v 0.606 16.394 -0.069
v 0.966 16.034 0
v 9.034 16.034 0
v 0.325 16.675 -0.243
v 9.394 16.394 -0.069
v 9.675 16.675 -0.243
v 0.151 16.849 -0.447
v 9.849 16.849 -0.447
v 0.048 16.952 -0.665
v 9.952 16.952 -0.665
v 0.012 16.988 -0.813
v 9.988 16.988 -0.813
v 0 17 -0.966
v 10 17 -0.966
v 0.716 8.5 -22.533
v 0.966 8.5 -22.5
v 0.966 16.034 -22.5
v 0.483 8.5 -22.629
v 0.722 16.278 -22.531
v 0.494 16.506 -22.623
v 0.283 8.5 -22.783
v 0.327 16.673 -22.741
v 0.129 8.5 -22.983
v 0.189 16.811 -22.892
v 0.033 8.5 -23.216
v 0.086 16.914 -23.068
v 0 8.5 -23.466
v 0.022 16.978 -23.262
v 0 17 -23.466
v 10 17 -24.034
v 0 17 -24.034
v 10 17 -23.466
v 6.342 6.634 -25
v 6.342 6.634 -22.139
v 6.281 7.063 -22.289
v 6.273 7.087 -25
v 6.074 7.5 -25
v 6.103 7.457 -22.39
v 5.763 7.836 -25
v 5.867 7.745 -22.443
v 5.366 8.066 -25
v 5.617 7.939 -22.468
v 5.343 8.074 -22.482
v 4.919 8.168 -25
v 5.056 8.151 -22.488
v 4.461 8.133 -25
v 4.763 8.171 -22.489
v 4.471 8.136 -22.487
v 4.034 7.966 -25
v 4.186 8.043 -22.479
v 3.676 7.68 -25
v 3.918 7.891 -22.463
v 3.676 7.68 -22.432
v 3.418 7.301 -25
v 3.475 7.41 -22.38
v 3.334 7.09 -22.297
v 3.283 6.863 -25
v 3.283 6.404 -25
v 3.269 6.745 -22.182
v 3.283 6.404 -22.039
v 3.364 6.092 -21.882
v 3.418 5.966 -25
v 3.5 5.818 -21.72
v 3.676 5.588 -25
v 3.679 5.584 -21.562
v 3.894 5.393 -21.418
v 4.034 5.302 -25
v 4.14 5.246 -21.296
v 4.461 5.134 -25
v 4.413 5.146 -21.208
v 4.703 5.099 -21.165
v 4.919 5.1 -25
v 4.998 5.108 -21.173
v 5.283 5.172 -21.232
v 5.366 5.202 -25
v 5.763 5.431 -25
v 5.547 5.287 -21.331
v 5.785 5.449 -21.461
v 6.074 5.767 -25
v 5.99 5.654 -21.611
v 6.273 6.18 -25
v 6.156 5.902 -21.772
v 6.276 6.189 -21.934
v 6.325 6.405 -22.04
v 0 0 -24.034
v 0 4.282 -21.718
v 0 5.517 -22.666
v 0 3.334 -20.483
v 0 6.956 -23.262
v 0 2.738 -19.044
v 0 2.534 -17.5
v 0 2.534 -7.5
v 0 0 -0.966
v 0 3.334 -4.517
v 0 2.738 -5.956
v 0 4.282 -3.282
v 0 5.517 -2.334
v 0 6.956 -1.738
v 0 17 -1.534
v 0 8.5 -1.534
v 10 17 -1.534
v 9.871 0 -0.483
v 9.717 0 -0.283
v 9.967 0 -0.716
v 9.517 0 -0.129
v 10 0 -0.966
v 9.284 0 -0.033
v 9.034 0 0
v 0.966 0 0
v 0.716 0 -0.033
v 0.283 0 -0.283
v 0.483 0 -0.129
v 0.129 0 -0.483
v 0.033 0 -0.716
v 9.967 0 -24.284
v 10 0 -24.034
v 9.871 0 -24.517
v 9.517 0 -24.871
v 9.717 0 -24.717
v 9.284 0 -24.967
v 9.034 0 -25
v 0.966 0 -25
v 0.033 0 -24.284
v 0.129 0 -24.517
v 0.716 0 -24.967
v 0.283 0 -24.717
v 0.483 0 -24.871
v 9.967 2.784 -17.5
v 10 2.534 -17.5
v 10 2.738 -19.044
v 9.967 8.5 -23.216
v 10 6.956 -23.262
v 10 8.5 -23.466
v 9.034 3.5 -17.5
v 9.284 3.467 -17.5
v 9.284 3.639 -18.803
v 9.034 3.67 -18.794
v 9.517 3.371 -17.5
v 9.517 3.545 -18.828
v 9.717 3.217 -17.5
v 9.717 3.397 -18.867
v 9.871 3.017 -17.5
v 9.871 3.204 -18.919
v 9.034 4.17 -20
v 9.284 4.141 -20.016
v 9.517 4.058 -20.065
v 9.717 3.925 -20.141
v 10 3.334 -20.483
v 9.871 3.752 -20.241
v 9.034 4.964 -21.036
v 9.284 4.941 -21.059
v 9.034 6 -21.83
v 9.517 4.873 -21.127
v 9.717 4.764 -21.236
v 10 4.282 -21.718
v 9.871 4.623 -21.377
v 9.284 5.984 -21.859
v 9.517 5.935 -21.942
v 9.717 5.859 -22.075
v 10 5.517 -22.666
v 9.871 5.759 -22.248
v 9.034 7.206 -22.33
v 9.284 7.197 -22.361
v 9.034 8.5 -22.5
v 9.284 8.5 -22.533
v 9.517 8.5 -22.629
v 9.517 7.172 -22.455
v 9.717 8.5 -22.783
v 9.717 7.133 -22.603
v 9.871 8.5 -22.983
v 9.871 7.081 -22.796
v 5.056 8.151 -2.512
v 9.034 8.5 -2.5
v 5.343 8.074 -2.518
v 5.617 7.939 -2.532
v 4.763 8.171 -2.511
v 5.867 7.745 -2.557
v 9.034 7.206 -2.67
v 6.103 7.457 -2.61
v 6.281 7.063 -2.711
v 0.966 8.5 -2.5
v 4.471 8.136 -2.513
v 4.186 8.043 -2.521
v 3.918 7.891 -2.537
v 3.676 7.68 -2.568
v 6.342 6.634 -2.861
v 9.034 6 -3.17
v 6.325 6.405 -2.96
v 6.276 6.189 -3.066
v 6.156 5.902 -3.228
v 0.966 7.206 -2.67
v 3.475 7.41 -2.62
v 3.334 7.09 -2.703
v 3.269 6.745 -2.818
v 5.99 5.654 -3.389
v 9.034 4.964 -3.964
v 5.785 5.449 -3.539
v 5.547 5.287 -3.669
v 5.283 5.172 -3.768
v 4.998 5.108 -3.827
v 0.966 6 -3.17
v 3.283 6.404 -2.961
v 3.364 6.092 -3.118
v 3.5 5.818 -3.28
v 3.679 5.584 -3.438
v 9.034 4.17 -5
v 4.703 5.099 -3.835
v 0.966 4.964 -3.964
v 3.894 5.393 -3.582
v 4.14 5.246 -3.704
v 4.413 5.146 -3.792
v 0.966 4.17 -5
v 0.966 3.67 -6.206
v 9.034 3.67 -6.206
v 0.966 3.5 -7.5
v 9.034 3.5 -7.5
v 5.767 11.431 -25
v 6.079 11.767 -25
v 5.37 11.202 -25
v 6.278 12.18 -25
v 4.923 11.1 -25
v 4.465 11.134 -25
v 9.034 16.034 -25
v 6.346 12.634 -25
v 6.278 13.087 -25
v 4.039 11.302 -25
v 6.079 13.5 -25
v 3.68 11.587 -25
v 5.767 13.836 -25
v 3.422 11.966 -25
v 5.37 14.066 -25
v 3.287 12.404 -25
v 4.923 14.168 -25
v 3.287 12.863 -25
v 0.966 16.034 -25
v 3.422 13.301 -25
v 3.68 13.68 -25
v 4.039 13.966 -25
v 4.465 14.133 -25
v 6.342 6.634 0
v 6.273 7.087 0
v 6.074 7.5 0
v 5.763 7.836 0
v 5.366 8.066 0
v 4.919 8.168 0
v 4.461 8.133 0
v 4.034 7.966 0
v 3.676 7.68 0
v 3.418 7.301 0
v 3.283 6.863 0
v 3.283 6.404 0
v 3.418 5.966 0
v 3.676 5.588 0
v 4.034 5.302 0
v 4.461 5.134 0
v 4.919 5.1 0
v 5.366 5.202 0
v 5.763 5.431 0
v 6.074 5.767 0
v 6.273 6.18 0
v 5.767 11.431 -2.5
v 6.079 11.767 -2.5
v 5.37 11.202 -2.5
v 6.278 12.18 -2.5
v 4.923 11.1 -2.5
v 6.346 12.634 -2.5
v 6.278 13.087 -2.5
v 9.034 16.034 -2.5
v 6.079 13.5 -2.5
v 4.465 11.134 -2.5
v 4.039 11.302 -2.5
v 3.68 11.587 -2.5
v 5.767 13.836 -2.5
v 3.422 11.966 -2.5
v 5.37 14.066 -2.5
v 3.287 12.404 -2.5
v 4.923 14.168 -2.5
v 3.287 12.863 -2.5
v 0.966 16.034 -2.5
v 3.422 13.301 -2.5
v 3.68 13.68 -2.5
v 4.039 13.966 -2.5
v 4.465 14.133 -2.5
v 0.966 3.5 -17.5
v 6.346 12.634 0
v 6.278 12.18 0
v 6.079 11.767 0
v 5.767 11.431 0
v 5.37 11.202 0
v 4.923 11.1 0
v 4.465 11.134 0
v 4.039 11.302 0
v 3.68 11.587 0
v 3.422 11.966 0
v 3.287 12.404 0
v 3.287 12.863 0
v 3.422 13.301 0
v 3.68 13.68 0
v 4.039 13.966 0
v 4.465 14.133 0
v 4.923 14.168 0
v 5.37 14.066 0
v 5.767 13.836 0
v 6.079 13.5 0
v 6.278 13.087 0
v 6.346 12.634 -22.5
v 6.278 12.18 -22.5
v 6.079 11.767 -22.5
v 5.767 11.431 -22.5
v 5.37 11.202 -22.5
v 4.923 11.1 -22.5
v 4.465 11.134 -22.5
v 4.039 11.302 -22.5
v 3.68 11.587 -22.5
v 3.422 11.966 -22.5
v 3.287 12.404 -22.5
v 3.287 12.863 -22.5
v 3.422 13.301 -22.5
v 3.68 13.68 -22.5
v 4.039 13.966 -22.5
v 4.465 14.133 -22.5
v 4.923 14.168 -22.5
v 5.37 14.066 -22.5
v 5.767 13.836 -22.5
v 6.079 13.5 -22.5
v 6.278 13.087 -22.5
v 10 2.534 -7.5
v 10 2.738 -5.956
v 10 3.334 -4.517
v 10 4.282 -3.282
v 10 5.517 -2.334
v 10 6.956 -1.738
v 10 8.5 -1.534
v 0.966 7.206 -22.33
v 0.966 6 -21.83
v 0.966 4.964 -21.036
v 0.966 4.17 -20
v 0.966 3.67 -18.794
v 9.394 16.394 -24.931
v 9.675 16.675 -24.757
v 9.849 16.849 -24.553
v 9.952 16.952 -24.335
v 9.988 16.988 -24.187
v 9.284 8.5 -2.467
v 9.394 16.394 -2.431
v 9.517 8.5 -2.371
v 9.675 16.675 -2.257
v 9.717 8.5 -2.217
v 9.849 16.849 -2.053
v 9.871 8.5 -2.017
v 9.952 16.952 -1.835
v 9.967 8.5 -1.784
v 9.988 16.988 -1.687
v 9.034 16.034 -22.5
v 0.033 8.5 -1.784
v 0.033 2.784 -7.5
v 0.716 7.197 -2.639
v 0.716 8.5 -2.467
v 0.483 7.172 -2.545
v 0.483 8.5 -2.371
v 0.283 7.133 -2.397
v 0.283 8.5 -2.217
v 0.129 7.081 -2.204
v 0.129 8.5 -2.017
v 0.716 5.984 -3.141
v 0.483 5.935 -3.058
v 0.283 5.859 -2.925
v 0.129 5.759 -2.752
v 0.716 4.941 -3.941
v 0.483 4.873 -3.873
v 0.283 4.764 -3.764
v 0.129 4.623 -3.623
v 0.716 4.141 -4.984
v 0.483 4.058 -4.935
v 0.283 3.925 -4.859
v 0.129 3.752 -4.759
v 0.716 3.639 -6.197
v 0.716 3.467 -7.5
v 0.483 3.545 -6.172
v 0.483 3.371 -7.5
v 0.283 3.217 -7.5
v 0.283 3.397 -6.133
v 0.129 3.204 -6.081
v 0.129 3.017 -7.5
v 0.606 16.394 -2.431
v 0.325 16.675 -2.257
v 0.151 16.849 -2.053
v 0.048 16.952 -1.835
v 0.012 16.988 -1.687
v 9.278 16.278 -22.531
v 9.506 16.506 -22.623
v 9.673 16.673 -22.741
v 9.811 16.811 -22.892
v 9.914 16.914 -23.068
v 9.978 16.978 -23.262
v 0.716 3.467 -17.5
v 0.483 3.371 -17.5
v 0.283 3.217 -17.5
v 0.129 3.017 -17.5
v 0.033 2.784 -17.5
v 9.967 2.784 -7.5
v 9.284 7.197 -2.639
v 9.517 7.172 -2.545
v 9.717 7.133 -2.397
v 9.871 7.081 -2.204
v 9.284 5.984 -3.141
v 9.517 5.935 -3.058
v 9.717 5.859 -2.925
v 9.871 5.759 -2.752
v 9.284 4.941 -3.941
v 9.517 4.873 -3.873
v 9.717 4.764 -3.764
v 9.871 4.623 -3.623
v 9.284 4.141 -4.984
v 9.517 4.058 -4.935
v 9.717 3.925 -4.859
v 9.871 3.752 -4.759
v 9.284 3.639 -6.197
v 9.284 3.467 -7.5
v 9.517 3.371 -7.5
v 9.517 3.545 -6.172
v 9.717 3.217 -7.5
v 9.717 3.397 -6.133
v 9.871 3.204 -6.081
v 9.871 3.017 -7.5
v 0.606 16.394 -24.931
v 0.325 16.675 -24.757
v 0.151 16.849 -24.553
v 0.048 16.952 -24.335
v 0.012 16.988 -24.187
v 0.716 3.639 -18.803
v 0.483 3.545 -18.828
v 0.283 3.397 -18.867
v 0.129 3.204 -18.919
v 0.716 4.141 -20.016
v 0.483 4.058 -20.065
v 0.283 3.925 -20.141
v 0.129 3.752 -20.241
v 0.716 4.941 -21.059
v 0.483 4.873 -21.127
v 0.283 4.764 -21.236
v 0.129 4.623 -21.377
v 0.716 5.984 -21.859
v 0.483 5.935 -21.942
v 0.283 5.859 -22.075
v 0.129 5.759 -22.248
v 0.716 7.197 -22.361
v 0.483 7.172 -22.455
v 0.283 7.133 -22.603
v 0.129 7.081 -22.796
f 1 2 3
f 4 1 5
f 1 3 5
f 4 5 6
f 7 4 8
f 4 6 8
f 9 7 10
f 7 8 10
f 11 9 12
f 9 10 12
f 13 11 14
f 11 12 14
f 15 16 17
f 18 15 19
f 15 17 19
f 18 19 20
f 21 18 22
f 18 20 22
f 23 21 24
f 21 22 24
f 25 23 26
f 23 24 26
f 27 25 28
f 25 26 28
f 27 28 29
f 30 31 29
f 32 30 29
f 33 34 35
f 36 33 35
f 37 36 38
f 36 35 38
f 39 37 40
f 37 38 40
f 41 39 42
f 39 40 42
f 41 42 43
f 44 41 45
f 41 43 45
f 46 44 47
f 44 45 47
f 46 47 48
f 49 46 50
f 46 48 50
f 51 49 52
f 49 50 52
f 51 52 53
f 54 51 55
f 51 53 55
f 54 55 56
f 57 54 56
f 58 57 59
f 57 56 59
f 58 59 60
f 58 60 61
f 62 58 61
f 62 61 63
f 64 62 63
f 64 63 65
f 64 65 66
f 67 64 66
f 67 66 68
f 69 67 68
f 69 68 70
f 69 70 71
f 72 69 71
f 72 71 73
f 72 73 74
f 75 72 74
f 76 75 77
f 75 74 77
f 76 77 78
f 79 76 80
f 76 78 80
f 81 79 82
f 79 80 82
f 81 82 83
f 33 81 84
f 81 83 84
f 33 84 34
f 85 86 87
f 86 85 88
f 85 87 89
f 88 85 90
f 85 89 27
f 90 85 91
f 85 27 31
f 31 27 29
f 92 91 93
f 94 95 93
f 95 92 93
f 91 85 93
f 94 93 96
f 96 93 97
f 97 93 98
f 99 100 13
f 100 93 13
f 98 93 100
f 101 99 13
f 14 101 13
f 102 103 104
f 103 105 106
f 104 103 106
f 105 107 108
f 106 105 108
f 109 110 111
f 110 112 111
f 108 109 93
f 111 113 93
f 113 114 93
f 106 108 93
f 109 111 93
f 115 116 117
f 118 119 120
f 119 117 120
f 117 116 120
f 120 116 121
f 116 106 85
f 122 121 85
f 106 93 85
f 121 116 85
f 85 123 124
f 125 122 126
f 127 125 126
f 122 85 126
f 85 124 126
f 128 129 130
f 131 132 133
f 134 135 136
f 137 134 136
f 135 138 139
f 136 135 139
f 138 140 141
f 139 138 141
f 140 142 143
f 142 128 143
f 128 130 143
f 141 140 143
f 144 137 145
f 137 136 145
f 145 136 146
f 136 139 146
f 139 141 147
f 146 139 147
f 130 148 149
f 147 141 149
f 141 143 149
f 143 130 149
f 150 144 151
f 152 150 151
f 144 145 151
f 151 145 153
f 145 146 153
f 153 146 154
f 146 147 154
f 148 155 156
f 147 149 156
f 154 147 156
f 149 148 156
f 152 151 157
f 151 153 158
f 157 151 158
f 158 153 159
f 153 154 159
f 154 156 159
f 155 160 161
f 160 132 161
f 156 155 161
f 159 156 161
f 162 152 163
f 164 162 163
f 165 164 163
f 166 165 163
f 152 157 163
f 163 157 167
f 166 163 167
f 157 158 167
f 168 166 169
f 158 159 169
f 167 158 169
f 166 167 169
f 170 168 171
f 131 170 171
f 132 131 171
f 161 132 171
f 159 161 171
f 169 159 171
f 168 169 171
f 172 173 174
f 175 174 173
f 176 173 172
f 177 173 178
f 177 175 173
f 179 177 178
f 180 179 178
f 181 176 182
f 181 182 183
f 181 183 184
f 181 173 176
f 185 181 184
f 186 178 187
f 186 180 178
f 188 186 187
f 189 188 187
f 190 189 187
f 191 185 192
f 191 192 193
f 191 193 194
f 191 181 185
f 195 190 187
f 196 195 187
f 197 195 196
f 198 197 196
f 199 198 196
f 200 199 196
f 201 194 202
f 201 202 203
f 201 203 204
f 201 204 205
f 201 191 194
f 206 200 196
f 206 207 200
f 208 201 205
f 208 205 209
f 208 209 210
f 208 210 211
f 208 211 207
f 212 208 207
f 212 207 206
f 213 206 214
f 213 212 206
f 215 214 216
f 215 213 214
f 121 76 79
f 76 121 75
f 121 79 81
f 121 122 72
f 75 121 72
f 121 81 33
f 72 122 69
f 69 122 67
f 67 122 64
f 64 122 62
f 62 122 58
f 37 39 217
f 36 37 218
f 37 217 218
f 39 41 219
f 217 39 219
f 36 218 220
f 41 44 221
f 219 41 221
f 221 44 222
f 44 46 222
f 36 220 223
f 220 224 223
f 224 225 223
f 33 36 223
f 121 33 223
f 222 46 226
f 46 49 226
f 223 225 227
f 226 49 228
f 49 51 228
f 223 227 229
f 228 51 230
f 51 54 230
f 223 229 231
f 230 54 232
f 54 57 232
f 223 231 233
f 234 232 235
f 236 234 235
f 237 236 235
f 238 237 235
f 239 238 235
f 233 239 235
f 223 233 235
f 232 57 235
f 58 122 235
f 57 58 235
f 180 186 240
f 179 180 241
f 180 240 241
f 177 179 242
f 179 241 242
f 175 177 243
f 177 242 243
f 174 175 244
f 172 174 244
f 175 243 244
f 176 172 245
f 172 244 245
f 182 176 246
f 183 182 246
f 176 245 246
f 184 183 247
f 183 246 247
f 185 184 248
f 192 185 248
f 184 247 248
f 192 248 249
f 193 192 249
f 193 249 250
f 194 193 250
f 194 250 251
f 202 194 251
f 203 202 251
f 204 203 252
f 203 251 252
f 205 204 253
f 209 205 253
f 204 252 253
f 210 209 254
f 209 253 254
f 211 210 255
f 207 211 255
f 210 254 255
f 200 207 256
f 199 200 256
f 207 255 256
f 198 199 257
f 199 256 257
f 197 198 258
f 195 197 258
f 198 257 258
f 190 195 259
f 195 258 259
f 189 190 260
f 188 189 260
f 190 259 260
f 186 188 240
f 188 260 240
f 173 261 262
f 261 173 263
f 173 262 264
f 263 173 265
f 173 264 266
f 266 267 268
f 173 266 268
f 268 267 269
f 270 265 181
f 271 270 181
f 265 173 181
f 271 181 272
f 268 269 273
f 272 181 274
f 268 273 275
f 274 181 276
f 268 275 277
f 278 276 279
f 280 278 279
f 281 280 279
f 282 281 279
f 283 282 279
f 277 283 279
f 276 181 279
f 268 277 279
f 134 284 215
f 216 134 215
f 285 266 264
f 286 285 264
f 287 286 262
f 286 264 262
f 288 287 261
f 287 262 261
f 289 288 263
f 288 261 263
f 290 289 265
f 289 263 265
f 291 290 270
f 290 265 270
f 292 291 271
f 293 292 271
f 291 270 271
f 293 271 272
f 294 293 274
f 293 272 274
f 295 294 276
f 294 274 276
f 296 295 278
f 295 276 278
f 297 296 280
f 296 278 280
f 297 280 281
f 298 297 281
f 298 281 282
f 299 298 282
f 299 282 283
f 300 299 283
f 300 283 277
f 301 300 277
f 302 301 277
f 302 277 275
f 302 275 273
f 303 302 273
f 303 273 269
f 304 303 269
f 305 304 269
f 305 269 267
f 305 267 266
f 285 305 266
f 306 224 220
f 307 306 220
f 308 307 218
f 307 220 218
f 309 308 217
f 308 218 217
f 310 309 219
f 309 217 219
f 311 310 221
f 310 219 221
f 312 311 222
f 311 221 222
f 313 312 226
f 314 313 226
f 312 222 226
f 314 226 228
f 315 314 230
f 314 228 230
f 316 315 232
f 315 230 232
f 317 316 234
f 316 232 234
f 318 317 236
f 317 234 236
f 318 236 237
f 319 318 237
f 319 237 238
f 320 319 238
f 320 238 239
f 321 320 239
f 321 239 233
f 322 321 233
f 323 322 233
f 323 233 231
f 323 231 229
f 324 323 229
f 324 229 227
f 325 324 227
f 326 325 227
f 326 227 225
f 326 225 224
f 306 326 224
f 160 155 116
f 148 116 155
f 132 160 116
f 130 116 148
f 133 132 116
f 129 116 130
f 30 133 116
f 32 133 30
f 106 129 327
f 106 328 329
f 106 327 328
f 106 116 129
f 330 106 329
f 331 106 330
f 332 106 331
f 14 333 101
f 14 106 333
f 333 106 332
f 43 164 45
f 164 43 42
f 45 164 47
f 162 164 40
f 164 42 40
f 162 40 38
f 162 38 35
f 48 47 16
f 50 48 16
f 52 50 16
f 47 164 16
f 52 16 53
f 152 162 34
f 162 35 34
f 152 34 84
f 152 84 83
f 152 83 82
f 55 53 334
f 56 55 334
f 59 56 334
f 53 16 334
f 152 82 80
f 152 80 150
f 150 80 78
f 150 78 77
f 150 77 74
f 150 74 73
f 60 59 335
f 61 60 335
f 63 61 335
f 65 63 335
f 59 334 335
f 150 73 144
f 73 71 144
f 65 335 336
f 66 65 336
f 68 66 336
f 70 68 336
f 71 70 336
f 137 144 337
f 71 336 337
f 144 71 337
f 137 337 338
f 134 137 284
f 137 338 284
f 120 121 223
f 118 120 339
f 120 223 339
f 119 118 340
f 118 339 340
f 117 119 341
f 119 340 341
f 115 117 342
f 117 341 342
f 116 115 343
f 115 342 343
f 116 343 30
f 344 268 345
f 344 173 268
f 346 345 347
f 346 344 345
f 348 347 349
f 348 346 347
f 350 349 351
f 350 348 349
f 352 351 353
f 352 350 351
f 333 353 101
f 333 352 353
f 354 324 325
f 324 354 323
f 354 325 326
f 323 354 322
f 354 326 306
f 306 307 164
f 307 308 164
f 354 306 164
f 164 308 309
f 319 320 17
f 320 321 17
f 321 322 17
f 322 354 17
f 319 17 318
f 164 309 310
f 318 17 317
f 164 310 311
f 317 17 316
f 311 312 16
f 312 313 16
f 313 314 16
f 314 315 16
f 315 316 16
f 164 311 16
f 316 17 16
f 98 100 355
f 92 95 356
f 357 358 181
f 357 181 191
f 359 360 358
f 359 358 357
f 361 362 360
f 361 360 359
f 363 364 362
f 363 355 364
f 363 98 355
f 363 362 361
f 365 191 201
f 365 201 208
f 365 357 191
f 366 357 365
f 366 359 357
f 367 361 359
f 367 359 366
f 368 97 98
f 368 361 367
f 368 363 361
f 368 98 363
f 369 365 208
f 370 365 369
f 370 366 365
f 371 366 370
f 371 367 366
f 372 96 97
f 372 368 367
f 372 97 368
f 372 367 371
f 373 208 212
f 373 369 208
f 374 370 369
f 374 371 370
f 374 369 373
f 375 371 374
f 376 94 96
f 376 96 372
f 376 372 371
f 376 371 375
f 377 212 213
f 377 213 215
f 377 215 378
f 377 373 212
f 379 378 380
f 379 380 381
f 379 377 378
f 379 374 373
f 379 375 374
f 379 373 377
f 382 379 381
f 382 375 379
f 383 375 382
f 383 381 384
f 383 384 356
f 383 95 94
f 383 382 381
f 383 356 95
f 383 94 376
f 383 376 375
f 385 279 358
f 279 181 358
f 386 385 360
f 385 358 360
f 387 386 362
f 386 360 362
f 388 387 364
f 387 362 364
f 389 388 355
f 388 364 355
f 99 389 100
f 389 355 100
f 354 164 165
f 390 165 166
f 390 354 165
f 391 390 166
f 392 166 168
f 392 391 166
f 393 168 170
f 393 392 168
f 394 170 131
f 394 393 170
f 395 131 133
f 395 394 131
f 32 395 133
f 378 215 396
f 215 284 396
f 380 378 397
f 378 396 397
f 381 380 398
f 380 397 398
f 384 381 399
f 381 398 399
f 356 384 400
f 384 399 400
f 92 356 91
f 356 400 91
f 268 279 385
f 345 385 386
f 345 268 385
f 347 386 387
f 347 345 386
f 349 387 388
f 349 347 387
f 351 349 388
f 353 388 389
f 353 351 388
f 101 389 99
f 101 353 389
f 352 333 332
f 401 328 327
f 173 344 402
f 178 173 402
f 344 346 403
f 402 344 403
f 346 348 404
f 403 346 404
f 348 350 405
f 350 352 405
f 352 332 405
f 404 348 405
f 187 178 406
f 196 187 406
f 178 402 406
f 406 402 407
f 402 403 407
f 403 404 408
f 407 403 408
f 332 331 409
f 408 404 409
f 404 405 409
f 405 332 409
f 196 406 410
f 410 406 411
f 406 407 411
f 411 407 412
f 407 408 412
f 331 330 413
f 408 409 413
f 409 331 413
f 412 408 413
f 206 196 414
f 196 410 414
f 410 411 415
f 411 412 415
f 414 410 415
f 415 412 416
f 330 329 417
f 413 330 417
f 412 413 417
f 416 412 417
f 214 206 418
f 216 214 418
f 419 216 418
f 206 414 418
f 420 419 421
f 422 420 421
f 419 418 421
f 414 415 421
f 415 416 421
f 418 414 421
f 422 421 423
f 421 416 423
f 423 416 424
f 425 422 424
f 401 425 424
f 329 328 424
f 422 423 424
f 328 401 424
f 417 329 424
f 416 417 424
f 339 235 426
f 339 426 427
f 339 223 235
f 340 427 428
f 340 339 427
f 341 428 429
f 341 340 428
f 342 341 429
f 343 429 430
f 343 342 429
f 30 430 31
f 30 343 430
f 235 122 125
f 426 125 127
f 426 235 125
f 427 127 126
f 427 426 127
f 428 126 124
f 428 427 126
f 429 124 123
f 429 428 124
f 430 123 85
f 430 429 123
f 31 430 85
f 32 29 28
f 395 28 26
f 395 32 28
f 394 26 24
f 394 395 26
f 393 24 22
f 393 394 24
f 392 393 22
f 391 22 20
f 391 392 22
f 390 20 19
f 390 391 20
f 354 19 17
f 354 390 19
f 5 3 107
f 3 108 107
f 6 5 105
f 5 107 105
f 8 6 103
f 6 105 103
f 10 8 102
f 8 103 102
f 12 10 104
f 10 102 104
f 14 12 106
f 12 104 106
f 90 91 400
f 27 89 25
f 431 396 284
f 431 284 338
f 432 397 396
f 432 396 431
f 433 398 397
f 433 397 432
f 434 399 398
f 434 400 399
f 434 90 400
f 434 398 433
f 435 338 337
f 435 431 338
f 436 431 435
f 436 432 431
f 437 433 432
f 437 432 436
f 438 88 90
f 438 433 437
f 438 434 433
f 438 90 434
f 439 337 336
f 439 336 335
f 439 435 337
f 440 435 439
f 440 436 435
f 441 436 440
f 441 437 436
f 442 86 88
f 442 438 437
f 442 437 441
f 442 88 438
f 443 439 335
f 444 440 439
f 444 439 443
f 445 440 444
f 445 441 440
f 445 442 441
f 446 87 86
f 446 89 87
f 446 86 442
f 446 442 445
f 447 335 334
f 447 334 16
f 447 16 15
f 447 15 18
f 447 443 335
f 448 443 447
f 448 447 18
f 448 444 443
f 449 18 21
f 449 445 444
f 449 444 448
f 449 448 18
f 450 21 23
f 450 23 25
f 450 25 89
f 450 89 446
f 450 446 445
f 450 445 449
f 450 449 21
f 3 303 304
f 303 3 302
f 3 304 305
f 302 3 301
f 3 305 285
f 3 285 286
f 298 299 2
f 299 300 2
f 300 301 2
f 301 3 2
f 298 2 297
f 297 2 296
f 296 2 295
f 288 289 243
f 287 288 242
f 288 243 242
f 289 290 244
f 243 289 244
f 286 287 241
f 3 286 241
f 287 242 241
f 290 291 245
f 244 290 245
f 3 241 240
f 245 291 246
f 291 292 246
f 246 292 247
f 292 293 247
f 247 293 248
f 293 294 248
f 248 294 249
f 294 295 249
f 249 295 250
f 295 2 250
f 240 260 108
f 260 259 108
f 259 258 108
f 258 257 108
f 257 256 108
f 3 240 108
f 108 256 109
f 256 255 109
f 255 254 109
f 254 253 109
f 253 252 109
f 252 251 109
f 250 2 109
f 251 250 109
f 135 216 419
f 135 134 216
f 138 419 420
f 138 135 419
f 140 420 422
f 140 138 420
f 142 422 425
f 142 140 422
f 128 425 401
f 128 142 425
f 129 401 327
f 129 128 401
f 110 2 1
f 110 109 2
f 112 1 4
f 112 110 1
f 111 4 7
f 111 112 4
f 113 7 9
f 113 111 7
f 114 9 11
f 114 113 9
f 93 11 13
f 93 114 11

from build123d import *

# Parameters (mm, degrees)
F1_DEPTH     = 10
F2_R         = 1.538196108
F3_DEPTH     = 25
F4_T4_DEPTH  = 10
F4_S5_R      = 1.538196108
F4_T6_DEPTH  = 8
F4_T10_DEPTH = 10
F4_S11_R     = 1.538196108
F4_T12_DEPTH = 8
F5_R         = 0.9656854249


# Not quite as in the source:
# - a fillet or chamfer that OpenCascade refuses, or shapes differently, is made with other operations: its cross-section is extruded or revolved along the edge and cut away or added


with BuildPart() as f1:
    # F0 (on Right) → F1 (new body)
    with BuildSketch(Plane.YZ):
        Polygon((17, 0), (0, 0), (0, -25), (17, -25), (17, -22.5), (3.5, -22.5), (3.5, -2.5), (17, -2.5), align=None)
    extrude(amount=F1_DEPTH)

    # F2 (on face) → F3 (cut)
    with BuildSketch(Plane(origin=(0, 0, -25), x_dir=(1, 0, 0), z_dir=(0, 0, -1))):
        with Locations((4.8035508953, -6.6337394528)):
            Circle(F2_R)
        with Locations((4.8077256637, -12.6337380004)):
            Circle(F2_R)
    extrude(amount=-F3_DEPTH, mode=Mode.SUBTRACT)

    # F4: fillet of radius 5 on 2 edges, made by hand


with BuildPart() as f4_tool2:
    # F4_s3 → F4_t4 (new body)
    with BuildSketch(Plane.YZ):
        with BuildLine():
            ThreePointArc((8.5, -2.5), (4.9644660941, -3.9644660941), (3.5, -7.5))
            Line((3.5, -7.5), (3.5, -2.5))
            Line((3.5, -2.5), (8.5, -2.5))
        make_face()
    extrude(amount=F4_T4_DEPTH)

    # F4_s5 → F4_t6 (cut, symmetric)
    with BuildSketch(Plane.XY.offset(-5)):
        with Locations((4.8035508953, 6.6337394528)):
            Circle(F4_S5_R)
    extrude(amount=F4_T6_DEPTH, both=True, mode=Mode.SUBTRACT)


with BuildPart() as f1_1:
    add(f1.part)

    # F4_t1: union F4_tool2
    add(f4_tool2.part)


with BuildPart() as f4_tool8:
    # F4_s9 → F4_t10 (new body)
    with BuildSketch(Plane.YZ):
        with BuildLine():
            ThreePointArc((8.5, -22.5), (4.9644660941, -21.0355339059), (3.5, -17.5))
            Line((3.5, -17.5), (3.5, -22.5))
            Line((3.5, -22.5), (8.5, -22.5))
        make_face()
    extrude(amount=F4_T10_DEPTH)

    # F4_s11 → F4_t12 (cut, symmetric)
    with BuildSketch(Plane.XY.offset(-20)):
        with Locations((4.8035508953, 6.6337394528)):
            Circle(F4_S11_R)
    extrude(amount=F4_T12_DEPTH, both=True, mode=Mode.SUBTRACT)


with BuildPart() as f1_2:
    add(f1_1.part)

    # F4_t7: union F4_tool8
    add(f4_tool8.part)

    # F5
    f5_edges = [f1_2.edges().sort_by_distance(p)[0] for p in [
        (5, 17, -22.5),
        (5, 17, -25),
        (5, 17, 0),
        (5, 17, -2.5),
        (0, 8.5, 0),
        (10, 8.5, 0),
        (10, 8.5, -25),
        (0, 8.5, -25),
        (10, 4.964466, -3.964466),
        (0, 4.964466, -3.964466),
        (0, 3.5, -12.5),
    ]]
    fillet(f5_edges, radius=F5_R)


solid = f1_2.part
